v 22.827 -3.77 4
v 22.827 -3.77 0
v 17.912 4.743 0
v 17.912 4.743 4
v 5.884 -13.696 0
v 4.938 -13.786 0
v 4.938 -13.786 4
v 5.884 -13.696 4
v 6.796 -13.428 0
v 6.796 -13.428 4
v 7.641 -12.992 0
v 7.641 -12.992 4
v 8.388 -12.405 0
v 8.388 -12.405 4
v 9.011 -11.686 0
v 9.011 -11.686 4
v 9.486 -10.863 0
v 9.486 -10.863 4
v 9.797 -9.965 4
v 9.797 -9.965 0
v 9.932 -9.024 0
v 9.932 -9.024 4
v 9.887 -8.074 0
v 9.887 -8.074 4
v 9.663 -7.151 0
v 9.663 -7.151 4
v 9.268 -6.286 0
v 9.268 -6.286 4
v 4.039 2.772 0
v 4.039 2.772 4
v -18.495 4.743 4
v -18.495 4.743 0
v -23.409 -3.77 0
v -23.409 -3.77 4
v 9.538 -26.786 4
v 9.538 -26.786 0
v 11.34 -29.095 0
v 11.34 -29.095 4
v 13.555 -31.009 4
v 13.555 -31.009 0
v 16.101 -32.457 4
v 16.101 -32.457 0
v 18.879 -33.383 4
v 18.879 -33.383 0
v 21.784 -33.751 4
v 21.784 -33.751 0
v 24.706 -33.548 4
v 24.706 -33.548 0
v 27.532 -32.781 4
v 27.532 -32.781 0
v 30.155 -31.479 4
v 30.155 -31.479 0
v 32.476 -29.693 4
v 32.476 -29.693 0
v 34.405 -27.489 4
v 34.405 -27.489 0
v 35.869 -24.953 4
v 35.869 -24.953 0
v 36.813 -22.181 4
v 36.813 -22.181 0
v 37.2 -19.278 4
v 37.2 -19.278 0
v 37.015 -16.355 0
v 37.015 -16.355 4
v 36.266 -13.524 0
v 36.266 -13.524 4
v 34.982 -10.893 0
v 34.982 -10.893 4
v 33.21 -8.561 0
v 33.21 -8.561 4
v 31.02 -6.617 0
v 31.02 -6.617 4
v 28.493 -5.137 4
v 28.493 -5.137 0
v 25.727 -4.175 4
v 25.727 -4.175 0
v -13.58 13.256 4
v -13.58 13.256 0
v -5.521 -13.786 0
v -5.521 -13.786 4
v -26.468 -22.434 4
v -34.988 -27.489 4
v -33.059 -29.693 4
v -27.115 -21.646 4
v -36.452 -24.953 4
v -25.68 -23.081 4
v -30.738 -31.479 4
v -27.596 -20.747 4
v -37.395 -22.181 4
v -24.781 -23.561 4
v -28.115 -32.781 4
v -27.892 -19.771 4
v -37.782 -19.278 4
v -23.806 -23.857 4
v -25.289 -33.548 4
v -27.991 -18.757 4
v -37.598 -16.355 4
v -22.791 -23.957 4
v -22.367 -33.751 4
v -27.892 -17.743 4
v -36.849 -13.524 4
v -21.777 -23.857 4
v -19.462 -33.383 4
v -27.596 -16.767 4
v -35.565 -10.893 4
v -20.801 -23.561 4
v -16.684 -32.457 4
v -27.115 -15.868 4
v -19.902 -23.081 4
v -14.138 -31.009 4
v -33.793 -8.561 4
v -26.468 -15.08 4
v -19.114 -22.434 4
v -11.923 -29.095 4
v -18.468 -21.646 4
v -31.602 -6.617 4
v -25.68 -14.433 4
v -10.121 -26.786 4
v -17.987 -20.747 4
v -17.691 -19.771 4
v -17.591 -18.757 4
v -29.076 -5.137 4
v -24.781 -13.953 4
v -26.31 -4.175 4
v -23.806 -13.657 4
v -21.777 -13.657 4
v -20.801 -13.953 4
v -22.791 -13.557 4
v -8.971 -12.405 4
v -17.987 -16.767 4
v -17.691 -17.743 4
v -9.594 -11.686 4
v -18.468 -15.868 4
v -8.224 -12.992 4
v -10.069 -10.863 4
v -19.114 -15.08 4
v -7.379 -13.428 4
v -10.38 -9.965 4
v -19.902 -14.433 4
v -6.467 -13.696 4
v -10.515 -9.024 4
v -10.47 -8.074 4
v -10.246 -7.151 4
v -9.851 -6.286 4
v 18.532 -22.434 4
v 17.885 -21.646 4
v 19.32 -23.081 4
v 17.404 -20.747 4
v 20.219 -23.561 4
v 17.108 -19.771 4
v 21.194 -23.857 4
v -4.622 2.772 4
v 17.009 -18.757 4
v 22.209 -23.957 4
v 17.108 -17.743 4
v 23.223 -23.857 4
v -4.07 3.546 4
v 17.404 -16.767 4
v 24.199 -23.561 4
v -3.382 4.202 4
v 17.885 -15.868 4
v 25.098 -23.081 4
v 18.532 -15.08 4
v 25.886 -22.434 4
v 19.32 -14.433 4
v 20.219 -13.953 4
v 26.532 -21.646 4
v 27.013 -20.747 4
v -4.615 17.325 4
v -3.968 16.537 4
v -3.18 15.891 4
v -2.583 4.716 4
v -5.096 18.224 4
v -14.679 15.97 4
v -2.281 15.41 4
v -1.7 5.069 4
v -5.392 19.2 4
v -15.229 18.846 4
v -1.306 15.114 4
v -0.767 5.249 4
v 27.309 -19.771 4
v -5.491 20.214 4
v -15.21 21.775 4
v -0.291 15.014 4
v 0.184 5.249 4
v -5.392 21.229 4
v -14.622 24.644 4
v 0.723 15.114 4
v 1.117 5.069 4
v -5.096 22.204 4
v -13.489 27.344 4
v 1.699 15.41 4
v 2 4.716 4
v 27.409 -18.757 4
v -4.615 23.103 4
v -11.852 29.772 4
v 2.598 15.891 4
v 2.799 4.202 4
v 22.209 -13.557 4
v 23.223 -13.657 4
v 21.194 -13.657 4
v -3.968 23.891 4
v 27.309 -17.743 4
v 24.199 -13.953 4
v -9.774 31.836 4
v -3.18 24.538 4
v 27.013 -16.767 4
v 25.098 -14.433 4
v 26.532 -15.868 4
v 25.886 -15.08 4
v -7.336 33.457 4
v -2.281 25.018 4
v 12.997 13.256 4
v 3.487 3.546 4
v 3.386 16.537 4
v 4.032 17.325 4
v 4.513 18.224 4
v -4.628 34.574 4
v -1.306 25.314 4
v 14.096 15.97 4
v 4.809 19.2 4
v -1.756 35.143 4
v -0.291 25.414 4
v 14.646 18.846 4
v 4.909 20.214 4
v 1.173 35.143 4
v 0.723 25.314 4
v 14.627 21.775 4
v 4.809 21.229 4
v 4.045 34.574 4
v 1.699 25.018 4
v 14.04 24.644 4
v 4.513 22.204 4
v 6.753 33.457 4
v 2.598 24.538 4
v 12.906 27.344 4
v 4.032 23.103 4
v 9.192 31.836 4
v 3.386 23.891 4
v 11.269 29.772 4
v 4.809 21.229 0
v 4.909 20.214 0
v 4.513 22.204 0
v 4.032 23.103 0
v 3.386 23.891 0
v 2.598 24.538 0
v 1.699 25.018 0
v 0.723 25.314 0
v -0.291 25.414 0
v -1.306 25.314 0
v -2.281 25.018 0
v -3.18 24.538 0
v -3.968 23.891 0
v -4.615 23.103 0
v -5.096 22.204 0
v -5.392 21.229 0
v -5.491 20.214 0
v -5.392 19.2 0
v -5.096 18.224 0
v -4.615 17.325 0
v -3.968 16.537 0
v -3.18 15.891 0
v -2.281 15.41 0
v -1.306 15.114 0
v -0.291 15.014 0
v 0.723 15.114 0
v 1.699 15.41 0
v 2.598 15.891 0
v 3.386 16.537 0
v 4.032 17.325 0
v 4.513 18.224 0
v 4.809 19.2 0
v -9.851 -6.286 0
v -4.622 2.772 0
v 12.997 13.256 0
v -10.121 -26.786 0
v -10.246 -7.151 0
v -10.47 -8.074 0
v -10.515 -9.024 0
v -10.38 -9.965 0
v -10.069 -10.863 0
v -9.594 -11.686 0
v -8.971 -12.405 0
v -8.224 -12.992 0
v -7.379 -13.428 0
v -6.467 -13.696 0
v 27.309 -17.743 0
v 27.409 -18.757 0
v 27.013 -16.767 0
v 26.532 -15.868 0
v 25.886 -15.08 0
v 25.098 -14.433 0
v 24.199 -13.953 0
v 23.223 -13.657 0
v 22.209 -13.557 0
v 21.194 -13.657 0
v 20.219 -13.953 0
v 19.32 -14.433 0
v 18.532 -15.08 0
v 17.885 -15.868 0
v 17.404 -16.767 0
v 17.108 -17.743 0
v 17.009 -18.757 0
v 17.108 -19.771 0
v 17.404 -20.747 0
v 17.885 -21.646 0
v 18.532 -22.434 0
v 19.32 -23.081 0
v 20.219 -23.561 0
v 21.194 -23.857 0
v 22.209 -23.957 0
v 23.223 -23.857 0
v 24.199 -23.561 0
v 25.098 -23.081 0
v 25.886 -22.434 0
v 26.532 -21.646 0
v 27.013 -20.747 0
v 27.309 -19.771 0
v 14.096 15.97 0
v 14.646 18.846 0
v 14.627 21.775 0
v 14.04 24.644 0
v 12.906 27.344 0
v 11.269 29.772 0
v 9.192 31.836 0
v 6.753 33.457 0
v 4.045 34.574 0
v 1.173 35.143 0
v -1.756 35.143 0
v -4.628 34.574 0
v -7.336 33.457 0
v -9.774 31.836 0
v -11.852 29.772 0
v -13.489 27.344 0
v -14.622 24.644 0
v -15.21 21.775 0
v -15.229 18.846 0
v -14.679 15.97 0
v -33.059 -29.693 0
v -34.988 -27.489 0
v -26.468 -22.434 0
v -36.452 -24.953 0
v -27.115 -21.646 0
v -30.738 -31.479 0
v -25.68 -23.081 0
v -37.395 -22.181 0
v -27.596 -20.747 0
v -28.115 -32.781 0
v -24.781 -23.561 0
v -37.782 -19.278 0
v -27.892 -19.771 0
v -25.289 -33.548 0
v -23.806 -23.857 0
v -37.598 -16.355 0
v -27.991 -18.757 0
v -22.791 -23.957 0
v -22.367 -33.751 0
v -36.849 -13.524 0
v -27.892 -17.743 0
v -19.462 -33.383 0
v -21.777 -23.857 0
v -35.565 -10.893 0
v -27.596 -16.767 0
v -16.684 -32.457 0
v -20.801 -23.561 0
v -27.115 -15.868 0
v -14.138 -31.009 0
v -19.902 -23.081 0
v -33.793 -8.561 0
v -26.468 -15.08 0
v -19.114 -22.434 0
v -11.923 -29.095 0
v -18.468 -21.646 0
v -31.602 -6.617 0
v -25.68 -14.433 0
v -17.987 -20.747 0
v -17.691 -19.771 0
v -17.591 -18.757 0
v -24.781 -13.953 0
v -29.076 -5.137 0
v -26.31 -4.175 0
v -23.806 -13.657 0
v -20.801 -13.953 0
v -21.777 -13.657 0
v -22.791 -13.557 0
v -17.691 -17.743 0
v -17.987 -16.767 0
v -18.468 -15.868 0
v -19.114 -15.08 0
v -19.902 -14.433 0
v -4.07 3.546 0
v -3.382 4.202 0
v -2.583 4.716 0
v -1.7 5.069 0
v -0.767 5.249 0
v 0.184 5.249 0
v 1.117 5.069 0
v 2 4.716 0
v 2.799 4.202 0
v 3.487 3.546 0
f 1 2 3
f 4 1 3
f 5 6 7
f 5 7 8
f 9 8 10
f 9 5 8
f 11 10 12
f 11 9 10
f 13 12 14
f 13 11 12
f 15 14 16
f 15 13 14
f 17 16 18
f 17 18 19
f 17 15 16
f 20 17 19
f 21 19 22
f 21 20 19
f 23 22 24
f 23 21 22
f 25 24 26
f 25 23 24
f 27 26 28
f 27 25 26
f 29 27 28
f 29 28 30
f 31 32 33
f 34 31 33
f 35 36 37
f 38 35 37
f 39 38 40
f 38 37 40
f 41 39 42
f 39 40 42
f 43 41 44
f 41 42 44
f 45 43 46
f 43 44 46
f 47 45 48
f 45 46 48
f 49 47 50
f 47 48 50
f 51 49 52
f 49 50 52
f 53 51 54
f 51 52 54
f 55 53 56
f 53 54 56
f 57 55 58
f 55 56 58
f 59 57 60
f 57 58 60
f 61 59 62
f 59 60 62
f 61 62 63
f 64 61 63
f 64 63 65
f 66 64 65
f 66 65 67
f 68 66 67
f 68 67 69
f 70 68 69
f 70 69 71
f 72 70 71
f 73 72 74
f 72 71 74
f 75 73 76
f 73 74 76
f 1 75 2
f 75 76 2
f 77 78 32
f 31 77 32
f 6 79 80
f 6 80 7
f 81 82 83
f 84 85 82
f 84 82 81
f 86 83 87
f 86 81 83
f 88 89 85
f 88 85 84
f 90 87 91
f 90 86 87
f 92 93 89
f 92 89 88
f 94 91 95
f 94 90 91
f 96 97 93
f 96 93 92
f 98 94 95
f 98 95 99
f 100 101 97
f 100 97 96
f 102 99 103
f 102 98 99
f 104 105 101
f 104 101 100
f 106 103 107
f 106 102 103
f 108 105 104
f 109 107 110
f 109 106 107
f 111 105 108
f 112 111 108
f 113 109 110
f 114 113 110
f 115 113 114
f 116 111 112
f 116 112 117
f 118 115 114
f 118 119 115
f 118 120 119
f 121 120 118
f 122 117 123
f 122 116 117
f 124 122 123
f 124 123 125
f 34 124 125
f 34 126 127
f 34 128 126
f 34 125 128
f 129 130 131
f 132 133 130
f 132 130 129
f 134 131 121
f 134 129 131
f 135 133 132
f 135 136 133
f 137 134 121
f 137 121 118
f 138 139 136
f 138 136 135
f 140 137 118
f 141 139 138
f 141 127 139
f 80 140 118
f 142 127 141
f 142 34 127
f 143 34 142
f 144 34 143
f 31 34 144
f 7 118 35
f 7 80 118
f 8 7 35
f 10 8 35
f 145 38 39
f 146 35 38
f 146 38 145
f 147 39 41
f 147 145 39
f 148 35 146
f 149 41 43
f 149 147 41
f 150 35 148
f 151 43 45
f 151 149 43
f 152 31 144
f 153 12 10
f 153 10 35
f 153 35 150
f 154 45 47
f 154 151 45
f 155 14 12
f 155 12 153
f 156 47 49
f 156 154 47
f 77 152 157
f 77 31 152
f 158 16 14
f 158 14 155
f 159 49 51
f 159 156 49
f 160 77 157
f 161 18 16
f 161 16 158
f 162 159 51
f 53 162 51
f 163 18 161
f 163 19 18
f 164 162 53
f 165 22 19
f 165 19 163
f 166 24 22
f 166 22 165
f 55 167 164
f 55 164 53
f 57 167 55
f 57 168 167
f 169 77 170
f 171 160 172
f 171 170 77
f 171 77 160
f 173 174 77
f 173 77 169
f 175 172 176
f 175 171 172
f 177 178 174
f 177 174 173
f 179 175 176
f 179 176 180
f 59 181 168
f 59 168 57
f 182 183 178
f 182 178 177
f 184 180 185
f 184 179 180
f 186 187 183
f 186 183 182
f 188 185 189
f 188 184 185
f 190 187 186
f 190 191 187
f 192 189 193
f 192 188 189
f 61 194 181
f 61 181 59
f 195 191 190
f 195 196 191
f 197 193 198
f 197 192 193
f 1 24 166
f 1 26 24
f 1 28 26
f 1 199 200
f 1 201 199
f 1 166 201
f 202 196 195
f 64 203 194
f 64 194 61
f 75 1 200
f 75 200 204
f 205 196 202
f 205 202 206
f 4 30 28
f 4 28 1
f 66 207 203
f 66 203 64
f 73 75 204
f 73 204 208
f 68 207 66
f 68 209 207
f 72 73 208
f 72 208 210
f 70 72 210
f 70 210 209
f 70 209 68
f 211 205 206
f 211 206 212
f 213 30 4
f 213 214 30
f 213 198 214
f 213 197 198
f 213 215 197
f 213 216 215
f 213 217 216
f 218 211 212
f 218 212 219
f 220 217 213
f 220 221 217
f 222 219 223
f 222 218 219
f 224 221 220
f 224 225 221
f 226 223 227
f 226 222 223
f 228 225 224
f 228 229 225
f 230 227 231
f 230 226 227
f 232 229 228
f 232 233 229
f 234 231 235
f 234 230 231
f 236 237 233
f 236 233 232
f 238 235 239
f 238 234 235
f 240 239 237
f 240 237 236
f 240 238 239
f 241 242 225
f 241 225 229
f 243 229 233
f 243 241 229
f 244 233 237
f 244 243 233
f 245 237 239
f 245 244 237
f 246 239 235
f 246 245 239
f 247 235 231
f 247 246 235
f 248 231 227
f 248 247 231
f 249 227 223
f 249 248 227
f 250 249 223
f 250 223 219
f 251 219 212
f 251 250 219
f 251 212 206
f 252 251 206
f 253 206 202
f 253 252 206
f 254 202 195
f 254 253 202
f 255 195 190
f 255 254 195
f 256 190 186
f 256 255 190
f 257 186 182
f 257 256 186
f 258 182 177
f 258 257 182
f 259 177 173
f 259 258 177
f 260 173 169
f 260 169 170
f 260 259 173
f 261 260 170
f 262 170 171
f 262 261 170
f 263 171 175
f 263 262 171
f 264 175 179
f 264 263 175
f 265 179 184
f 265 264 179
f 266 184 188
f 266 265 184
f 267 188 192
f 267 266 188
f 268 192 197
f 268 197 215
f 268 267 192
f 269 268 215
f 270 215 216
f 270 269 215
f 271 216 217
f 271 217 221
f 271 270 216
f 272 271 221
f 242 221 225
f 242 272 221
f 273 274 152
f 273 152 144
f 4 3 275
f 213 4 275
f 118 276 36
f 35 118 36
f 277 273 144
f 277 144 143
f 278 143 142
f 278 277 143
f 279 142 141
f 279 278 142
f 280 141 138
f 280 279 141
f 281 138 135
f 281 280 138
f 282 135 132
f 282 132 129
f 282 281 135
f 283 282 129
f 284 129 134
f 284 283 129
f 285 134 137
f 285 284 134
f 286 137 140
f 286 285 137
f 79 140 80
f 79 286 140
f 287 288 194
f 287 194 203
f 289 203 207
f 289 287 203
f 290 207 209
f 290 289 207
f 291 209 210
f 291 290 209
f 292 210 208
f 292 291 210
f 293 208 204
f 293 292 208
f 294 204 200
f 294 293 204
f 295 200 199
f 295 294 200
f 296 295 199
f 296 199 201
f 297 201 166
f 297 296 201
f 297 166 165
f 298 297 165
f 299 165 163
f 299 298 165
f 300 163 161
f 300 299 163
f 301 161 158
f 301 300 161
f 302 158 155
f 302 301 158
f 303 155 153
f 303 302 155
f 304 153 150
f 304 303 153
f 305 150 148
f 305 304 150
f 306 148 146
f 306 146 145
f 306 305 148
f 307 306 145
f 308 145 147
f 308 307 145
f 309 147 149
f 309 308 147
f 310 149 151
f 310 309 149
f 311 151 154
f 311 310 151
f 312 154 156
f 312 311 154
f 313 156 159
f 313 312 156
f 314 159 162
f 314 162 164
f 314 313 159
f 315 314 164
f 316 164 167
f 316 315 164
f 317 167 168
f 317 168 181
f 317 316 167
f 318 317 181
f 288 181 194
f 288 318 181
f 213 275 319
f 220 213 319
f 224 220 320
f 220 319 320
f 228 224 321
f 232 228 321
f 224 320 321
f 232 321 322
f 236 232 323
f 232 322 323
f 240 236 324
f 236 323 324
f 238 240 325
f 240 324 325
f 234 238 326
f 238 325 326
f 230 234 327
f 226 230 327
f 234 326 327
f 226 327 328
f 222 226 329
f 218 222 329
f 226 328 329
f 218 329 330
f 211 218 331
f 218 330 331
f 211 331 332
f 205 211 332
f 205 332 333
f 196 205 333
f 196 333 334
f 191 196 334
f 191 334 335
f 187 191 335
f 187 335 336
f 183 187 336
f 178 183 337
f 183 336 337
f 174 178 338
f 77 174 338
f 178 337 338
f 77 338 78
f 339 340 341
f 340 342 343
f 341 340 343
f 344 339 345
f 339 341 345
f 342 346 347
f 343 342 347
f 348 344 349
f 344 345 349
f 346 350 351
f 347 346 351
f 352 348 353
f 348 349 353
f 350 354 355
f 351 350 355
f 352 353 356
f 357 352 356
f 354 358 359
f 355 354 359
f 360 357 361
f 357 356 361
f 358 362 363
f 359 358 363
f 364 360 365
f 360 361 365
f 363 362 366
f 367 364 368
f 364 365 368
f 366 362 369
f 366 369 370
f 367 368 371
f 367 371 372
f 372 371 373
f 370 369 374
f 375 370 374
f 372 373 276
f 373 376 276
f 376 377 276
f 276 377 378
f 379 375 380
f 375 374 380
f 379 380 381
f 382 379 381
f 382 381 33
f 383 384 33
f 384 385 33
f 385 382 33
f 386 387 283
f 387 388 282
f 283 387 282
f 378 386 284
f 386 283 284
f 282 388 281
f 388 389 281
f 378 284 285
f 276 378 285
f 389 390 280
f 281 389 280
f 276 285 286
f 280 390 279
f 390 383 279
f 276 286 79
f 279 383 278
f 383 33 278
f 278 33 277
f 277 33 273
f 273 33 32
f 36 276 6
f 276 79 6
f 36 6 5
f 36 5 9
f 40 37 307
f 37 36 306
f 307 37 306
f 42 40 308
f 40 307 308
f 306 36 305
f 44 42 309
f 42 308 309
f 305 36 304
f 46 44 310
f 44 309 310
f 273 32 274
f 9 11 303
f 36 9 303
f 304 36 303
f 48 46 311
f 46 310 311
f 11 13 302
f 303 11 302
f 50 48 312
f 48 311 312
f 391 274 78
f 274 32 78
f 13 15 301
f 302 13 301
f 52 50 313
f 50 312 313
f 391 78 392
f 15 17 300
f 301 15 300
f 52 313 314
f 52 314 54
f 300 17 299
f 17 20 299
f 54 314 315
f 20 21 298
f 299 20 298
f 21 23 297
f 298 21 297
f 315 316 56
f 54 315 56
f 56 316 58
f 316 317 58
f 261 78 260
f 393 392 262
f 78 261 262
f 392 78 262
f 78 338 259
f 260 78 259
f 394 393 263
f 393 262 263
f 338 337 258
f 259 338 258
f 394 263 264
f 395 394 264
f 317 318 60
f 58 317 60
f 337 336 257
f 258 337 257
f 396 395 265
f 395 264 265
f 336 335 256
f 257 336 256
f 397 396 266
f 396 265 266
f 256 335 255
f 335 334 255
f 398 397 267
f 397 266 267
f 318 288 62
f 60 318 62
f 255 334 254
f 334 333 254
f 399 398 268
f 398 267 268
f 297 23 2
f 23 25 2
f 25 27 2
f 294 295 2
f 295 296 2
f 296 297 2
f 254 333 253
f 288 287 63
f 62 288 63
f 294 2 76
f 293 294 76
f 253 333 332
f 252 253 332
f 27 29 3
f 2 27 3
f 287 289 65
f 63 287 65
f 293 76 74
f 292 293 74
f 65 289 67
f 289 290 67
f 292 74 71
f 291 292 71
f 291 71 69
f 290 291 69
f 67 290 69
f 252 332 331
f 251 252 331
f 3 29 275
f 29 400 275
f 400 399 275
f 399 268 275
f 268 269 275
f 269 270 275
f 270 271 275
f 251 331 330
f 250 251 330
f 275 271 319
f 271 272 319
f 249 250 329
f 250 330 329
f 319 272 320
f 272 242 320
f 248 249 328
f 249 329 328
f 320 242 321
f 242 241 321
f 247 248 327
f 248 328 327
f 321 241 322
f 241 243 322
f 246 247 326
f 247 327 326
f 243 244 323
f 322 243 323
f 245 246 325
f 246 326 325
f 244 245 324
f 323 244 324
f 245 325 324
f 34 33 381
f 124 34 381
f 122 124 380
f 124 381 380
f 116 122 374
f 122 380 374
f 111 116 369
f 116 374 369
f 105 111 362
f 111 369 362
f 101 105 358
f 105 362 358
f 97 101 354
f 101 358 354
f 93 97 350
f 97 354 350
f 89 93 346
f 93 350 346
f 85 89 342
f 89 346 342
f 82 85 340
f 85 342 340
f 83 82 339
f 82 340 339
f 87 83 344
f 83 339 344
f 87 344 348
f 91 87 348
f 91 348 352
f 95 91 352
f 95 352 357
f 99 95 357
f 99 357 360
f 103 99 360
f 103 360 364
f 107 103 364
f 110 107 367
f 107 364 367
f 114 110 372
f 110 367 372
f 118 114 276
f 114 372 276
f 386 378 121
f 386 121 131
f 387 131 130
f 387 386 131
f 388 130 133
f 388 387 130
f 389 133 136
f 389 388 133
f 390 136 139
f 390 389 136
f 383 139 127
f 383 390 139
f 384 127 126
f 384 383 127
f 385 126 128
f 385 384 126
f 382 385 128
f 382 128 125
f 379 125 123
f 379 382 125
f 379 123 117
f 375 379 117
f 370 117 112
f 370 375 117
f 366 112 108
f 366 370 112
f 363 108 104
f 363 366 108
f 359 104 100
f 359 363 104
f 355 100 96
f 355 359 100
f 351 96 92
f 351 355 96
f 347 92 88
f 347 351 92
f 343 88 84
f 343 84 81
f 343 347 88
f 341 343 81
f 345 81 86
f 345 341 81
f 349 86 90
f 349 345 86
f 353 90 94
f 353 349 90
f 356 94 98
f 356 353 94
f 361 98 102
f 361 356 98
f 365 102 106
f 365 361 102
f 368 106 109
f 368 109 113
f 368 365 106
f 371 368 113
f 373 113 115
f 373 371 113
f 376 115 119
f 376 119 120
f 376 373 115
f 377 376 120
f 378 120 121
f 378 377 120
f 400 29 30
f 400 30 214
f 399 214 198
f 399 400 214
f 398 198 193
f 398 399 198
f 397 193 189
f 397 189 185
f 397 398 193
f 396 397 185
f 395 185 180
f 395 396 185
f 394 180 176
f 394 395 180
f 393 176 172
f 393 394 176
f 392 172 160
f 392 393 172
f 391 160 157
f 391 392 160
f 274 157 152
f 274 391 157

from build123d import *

# Parameters (mm, degrees)
SKETCH_1_R      = 5.2
EXTRUDE_1_DEPTH = 4


with BuildPart() as part:
    # 草图1 → 凸台-拉伸1 (new body)
    with BuildSketch(Plane.XY):
        with BuildLine():
            Line((-18.494622549, 4.742999843), (-23.409453688, -3.769737399))
            ThreePointArc((-23.409453688, -3.769737399), (-35.781809628, -26.257000157), (-10.121090849, -26.785856986))
            Line((-10.121090849, -26.785856986), (-0.291428571, -26.785856986))
            Line((-0.291428571, -26.785856986), (9.538233706, -26.785856986))
            ThreePointArc((9.538233706, -26.785856986), (35.198952485, -26.257000157), (22.826596545, -3.769737399))
            Line((22.826596545, -3.769737399), (17.911765406, 4.742999843))
            Line((17.911765406, 4.742999843), (12.996934268, 13.255737086))
            ThreePointArc((12.996934268, 13.255737086), (-0.291428571, 35.214143014), (-13.579791411, 13.255737086))
            Line((-13.579791411, 13.255737086), (-18.494622549, 4.742999843))
        make_face()
        with Locations((-0.291428571, 20.214143014)):
            Circle(SKETCH_1_R, mode=Mode.SUBTRACT)
        with Locations((22.208571429, -18.757000157)):
            Circle(SKETCH_1_R, mode=Mode.SUBTRACT)
        with Locations((-22.791428571, -18.757000157)):
            Circle(SKETCH_1_R, mode=Mode.SUBTRACT)
        with BuildLine():
            Line((9.268171867, -6.285856986), (4.038698447, 2.771856673))
            ThreePointArc((4.038698447, 2.771856673), (-0.291428571, 5.271856673), (-4.62155559, 2.771856673))
            Line((-4.62155559, 2.771856673), (-9.85102901, -6.285856986))
            ThreePointArc((-9.85102901, -6.285856986), (-9.85102901, -11.285856986), (-5.520901991, -13.785856986))
            Line((-5.520901991, -13.785856986), (4.938044848, -13.785856986))
            ThreePointArc((4.938044848, -13.785856986), (9.268171867, -11.285856986), (9.268171867, -6.285856986))
        make_face(mode=Mode.SUBTRACT)
    extrude(amount=EXTRUDE_1_DEPTH)


solid = part.part
